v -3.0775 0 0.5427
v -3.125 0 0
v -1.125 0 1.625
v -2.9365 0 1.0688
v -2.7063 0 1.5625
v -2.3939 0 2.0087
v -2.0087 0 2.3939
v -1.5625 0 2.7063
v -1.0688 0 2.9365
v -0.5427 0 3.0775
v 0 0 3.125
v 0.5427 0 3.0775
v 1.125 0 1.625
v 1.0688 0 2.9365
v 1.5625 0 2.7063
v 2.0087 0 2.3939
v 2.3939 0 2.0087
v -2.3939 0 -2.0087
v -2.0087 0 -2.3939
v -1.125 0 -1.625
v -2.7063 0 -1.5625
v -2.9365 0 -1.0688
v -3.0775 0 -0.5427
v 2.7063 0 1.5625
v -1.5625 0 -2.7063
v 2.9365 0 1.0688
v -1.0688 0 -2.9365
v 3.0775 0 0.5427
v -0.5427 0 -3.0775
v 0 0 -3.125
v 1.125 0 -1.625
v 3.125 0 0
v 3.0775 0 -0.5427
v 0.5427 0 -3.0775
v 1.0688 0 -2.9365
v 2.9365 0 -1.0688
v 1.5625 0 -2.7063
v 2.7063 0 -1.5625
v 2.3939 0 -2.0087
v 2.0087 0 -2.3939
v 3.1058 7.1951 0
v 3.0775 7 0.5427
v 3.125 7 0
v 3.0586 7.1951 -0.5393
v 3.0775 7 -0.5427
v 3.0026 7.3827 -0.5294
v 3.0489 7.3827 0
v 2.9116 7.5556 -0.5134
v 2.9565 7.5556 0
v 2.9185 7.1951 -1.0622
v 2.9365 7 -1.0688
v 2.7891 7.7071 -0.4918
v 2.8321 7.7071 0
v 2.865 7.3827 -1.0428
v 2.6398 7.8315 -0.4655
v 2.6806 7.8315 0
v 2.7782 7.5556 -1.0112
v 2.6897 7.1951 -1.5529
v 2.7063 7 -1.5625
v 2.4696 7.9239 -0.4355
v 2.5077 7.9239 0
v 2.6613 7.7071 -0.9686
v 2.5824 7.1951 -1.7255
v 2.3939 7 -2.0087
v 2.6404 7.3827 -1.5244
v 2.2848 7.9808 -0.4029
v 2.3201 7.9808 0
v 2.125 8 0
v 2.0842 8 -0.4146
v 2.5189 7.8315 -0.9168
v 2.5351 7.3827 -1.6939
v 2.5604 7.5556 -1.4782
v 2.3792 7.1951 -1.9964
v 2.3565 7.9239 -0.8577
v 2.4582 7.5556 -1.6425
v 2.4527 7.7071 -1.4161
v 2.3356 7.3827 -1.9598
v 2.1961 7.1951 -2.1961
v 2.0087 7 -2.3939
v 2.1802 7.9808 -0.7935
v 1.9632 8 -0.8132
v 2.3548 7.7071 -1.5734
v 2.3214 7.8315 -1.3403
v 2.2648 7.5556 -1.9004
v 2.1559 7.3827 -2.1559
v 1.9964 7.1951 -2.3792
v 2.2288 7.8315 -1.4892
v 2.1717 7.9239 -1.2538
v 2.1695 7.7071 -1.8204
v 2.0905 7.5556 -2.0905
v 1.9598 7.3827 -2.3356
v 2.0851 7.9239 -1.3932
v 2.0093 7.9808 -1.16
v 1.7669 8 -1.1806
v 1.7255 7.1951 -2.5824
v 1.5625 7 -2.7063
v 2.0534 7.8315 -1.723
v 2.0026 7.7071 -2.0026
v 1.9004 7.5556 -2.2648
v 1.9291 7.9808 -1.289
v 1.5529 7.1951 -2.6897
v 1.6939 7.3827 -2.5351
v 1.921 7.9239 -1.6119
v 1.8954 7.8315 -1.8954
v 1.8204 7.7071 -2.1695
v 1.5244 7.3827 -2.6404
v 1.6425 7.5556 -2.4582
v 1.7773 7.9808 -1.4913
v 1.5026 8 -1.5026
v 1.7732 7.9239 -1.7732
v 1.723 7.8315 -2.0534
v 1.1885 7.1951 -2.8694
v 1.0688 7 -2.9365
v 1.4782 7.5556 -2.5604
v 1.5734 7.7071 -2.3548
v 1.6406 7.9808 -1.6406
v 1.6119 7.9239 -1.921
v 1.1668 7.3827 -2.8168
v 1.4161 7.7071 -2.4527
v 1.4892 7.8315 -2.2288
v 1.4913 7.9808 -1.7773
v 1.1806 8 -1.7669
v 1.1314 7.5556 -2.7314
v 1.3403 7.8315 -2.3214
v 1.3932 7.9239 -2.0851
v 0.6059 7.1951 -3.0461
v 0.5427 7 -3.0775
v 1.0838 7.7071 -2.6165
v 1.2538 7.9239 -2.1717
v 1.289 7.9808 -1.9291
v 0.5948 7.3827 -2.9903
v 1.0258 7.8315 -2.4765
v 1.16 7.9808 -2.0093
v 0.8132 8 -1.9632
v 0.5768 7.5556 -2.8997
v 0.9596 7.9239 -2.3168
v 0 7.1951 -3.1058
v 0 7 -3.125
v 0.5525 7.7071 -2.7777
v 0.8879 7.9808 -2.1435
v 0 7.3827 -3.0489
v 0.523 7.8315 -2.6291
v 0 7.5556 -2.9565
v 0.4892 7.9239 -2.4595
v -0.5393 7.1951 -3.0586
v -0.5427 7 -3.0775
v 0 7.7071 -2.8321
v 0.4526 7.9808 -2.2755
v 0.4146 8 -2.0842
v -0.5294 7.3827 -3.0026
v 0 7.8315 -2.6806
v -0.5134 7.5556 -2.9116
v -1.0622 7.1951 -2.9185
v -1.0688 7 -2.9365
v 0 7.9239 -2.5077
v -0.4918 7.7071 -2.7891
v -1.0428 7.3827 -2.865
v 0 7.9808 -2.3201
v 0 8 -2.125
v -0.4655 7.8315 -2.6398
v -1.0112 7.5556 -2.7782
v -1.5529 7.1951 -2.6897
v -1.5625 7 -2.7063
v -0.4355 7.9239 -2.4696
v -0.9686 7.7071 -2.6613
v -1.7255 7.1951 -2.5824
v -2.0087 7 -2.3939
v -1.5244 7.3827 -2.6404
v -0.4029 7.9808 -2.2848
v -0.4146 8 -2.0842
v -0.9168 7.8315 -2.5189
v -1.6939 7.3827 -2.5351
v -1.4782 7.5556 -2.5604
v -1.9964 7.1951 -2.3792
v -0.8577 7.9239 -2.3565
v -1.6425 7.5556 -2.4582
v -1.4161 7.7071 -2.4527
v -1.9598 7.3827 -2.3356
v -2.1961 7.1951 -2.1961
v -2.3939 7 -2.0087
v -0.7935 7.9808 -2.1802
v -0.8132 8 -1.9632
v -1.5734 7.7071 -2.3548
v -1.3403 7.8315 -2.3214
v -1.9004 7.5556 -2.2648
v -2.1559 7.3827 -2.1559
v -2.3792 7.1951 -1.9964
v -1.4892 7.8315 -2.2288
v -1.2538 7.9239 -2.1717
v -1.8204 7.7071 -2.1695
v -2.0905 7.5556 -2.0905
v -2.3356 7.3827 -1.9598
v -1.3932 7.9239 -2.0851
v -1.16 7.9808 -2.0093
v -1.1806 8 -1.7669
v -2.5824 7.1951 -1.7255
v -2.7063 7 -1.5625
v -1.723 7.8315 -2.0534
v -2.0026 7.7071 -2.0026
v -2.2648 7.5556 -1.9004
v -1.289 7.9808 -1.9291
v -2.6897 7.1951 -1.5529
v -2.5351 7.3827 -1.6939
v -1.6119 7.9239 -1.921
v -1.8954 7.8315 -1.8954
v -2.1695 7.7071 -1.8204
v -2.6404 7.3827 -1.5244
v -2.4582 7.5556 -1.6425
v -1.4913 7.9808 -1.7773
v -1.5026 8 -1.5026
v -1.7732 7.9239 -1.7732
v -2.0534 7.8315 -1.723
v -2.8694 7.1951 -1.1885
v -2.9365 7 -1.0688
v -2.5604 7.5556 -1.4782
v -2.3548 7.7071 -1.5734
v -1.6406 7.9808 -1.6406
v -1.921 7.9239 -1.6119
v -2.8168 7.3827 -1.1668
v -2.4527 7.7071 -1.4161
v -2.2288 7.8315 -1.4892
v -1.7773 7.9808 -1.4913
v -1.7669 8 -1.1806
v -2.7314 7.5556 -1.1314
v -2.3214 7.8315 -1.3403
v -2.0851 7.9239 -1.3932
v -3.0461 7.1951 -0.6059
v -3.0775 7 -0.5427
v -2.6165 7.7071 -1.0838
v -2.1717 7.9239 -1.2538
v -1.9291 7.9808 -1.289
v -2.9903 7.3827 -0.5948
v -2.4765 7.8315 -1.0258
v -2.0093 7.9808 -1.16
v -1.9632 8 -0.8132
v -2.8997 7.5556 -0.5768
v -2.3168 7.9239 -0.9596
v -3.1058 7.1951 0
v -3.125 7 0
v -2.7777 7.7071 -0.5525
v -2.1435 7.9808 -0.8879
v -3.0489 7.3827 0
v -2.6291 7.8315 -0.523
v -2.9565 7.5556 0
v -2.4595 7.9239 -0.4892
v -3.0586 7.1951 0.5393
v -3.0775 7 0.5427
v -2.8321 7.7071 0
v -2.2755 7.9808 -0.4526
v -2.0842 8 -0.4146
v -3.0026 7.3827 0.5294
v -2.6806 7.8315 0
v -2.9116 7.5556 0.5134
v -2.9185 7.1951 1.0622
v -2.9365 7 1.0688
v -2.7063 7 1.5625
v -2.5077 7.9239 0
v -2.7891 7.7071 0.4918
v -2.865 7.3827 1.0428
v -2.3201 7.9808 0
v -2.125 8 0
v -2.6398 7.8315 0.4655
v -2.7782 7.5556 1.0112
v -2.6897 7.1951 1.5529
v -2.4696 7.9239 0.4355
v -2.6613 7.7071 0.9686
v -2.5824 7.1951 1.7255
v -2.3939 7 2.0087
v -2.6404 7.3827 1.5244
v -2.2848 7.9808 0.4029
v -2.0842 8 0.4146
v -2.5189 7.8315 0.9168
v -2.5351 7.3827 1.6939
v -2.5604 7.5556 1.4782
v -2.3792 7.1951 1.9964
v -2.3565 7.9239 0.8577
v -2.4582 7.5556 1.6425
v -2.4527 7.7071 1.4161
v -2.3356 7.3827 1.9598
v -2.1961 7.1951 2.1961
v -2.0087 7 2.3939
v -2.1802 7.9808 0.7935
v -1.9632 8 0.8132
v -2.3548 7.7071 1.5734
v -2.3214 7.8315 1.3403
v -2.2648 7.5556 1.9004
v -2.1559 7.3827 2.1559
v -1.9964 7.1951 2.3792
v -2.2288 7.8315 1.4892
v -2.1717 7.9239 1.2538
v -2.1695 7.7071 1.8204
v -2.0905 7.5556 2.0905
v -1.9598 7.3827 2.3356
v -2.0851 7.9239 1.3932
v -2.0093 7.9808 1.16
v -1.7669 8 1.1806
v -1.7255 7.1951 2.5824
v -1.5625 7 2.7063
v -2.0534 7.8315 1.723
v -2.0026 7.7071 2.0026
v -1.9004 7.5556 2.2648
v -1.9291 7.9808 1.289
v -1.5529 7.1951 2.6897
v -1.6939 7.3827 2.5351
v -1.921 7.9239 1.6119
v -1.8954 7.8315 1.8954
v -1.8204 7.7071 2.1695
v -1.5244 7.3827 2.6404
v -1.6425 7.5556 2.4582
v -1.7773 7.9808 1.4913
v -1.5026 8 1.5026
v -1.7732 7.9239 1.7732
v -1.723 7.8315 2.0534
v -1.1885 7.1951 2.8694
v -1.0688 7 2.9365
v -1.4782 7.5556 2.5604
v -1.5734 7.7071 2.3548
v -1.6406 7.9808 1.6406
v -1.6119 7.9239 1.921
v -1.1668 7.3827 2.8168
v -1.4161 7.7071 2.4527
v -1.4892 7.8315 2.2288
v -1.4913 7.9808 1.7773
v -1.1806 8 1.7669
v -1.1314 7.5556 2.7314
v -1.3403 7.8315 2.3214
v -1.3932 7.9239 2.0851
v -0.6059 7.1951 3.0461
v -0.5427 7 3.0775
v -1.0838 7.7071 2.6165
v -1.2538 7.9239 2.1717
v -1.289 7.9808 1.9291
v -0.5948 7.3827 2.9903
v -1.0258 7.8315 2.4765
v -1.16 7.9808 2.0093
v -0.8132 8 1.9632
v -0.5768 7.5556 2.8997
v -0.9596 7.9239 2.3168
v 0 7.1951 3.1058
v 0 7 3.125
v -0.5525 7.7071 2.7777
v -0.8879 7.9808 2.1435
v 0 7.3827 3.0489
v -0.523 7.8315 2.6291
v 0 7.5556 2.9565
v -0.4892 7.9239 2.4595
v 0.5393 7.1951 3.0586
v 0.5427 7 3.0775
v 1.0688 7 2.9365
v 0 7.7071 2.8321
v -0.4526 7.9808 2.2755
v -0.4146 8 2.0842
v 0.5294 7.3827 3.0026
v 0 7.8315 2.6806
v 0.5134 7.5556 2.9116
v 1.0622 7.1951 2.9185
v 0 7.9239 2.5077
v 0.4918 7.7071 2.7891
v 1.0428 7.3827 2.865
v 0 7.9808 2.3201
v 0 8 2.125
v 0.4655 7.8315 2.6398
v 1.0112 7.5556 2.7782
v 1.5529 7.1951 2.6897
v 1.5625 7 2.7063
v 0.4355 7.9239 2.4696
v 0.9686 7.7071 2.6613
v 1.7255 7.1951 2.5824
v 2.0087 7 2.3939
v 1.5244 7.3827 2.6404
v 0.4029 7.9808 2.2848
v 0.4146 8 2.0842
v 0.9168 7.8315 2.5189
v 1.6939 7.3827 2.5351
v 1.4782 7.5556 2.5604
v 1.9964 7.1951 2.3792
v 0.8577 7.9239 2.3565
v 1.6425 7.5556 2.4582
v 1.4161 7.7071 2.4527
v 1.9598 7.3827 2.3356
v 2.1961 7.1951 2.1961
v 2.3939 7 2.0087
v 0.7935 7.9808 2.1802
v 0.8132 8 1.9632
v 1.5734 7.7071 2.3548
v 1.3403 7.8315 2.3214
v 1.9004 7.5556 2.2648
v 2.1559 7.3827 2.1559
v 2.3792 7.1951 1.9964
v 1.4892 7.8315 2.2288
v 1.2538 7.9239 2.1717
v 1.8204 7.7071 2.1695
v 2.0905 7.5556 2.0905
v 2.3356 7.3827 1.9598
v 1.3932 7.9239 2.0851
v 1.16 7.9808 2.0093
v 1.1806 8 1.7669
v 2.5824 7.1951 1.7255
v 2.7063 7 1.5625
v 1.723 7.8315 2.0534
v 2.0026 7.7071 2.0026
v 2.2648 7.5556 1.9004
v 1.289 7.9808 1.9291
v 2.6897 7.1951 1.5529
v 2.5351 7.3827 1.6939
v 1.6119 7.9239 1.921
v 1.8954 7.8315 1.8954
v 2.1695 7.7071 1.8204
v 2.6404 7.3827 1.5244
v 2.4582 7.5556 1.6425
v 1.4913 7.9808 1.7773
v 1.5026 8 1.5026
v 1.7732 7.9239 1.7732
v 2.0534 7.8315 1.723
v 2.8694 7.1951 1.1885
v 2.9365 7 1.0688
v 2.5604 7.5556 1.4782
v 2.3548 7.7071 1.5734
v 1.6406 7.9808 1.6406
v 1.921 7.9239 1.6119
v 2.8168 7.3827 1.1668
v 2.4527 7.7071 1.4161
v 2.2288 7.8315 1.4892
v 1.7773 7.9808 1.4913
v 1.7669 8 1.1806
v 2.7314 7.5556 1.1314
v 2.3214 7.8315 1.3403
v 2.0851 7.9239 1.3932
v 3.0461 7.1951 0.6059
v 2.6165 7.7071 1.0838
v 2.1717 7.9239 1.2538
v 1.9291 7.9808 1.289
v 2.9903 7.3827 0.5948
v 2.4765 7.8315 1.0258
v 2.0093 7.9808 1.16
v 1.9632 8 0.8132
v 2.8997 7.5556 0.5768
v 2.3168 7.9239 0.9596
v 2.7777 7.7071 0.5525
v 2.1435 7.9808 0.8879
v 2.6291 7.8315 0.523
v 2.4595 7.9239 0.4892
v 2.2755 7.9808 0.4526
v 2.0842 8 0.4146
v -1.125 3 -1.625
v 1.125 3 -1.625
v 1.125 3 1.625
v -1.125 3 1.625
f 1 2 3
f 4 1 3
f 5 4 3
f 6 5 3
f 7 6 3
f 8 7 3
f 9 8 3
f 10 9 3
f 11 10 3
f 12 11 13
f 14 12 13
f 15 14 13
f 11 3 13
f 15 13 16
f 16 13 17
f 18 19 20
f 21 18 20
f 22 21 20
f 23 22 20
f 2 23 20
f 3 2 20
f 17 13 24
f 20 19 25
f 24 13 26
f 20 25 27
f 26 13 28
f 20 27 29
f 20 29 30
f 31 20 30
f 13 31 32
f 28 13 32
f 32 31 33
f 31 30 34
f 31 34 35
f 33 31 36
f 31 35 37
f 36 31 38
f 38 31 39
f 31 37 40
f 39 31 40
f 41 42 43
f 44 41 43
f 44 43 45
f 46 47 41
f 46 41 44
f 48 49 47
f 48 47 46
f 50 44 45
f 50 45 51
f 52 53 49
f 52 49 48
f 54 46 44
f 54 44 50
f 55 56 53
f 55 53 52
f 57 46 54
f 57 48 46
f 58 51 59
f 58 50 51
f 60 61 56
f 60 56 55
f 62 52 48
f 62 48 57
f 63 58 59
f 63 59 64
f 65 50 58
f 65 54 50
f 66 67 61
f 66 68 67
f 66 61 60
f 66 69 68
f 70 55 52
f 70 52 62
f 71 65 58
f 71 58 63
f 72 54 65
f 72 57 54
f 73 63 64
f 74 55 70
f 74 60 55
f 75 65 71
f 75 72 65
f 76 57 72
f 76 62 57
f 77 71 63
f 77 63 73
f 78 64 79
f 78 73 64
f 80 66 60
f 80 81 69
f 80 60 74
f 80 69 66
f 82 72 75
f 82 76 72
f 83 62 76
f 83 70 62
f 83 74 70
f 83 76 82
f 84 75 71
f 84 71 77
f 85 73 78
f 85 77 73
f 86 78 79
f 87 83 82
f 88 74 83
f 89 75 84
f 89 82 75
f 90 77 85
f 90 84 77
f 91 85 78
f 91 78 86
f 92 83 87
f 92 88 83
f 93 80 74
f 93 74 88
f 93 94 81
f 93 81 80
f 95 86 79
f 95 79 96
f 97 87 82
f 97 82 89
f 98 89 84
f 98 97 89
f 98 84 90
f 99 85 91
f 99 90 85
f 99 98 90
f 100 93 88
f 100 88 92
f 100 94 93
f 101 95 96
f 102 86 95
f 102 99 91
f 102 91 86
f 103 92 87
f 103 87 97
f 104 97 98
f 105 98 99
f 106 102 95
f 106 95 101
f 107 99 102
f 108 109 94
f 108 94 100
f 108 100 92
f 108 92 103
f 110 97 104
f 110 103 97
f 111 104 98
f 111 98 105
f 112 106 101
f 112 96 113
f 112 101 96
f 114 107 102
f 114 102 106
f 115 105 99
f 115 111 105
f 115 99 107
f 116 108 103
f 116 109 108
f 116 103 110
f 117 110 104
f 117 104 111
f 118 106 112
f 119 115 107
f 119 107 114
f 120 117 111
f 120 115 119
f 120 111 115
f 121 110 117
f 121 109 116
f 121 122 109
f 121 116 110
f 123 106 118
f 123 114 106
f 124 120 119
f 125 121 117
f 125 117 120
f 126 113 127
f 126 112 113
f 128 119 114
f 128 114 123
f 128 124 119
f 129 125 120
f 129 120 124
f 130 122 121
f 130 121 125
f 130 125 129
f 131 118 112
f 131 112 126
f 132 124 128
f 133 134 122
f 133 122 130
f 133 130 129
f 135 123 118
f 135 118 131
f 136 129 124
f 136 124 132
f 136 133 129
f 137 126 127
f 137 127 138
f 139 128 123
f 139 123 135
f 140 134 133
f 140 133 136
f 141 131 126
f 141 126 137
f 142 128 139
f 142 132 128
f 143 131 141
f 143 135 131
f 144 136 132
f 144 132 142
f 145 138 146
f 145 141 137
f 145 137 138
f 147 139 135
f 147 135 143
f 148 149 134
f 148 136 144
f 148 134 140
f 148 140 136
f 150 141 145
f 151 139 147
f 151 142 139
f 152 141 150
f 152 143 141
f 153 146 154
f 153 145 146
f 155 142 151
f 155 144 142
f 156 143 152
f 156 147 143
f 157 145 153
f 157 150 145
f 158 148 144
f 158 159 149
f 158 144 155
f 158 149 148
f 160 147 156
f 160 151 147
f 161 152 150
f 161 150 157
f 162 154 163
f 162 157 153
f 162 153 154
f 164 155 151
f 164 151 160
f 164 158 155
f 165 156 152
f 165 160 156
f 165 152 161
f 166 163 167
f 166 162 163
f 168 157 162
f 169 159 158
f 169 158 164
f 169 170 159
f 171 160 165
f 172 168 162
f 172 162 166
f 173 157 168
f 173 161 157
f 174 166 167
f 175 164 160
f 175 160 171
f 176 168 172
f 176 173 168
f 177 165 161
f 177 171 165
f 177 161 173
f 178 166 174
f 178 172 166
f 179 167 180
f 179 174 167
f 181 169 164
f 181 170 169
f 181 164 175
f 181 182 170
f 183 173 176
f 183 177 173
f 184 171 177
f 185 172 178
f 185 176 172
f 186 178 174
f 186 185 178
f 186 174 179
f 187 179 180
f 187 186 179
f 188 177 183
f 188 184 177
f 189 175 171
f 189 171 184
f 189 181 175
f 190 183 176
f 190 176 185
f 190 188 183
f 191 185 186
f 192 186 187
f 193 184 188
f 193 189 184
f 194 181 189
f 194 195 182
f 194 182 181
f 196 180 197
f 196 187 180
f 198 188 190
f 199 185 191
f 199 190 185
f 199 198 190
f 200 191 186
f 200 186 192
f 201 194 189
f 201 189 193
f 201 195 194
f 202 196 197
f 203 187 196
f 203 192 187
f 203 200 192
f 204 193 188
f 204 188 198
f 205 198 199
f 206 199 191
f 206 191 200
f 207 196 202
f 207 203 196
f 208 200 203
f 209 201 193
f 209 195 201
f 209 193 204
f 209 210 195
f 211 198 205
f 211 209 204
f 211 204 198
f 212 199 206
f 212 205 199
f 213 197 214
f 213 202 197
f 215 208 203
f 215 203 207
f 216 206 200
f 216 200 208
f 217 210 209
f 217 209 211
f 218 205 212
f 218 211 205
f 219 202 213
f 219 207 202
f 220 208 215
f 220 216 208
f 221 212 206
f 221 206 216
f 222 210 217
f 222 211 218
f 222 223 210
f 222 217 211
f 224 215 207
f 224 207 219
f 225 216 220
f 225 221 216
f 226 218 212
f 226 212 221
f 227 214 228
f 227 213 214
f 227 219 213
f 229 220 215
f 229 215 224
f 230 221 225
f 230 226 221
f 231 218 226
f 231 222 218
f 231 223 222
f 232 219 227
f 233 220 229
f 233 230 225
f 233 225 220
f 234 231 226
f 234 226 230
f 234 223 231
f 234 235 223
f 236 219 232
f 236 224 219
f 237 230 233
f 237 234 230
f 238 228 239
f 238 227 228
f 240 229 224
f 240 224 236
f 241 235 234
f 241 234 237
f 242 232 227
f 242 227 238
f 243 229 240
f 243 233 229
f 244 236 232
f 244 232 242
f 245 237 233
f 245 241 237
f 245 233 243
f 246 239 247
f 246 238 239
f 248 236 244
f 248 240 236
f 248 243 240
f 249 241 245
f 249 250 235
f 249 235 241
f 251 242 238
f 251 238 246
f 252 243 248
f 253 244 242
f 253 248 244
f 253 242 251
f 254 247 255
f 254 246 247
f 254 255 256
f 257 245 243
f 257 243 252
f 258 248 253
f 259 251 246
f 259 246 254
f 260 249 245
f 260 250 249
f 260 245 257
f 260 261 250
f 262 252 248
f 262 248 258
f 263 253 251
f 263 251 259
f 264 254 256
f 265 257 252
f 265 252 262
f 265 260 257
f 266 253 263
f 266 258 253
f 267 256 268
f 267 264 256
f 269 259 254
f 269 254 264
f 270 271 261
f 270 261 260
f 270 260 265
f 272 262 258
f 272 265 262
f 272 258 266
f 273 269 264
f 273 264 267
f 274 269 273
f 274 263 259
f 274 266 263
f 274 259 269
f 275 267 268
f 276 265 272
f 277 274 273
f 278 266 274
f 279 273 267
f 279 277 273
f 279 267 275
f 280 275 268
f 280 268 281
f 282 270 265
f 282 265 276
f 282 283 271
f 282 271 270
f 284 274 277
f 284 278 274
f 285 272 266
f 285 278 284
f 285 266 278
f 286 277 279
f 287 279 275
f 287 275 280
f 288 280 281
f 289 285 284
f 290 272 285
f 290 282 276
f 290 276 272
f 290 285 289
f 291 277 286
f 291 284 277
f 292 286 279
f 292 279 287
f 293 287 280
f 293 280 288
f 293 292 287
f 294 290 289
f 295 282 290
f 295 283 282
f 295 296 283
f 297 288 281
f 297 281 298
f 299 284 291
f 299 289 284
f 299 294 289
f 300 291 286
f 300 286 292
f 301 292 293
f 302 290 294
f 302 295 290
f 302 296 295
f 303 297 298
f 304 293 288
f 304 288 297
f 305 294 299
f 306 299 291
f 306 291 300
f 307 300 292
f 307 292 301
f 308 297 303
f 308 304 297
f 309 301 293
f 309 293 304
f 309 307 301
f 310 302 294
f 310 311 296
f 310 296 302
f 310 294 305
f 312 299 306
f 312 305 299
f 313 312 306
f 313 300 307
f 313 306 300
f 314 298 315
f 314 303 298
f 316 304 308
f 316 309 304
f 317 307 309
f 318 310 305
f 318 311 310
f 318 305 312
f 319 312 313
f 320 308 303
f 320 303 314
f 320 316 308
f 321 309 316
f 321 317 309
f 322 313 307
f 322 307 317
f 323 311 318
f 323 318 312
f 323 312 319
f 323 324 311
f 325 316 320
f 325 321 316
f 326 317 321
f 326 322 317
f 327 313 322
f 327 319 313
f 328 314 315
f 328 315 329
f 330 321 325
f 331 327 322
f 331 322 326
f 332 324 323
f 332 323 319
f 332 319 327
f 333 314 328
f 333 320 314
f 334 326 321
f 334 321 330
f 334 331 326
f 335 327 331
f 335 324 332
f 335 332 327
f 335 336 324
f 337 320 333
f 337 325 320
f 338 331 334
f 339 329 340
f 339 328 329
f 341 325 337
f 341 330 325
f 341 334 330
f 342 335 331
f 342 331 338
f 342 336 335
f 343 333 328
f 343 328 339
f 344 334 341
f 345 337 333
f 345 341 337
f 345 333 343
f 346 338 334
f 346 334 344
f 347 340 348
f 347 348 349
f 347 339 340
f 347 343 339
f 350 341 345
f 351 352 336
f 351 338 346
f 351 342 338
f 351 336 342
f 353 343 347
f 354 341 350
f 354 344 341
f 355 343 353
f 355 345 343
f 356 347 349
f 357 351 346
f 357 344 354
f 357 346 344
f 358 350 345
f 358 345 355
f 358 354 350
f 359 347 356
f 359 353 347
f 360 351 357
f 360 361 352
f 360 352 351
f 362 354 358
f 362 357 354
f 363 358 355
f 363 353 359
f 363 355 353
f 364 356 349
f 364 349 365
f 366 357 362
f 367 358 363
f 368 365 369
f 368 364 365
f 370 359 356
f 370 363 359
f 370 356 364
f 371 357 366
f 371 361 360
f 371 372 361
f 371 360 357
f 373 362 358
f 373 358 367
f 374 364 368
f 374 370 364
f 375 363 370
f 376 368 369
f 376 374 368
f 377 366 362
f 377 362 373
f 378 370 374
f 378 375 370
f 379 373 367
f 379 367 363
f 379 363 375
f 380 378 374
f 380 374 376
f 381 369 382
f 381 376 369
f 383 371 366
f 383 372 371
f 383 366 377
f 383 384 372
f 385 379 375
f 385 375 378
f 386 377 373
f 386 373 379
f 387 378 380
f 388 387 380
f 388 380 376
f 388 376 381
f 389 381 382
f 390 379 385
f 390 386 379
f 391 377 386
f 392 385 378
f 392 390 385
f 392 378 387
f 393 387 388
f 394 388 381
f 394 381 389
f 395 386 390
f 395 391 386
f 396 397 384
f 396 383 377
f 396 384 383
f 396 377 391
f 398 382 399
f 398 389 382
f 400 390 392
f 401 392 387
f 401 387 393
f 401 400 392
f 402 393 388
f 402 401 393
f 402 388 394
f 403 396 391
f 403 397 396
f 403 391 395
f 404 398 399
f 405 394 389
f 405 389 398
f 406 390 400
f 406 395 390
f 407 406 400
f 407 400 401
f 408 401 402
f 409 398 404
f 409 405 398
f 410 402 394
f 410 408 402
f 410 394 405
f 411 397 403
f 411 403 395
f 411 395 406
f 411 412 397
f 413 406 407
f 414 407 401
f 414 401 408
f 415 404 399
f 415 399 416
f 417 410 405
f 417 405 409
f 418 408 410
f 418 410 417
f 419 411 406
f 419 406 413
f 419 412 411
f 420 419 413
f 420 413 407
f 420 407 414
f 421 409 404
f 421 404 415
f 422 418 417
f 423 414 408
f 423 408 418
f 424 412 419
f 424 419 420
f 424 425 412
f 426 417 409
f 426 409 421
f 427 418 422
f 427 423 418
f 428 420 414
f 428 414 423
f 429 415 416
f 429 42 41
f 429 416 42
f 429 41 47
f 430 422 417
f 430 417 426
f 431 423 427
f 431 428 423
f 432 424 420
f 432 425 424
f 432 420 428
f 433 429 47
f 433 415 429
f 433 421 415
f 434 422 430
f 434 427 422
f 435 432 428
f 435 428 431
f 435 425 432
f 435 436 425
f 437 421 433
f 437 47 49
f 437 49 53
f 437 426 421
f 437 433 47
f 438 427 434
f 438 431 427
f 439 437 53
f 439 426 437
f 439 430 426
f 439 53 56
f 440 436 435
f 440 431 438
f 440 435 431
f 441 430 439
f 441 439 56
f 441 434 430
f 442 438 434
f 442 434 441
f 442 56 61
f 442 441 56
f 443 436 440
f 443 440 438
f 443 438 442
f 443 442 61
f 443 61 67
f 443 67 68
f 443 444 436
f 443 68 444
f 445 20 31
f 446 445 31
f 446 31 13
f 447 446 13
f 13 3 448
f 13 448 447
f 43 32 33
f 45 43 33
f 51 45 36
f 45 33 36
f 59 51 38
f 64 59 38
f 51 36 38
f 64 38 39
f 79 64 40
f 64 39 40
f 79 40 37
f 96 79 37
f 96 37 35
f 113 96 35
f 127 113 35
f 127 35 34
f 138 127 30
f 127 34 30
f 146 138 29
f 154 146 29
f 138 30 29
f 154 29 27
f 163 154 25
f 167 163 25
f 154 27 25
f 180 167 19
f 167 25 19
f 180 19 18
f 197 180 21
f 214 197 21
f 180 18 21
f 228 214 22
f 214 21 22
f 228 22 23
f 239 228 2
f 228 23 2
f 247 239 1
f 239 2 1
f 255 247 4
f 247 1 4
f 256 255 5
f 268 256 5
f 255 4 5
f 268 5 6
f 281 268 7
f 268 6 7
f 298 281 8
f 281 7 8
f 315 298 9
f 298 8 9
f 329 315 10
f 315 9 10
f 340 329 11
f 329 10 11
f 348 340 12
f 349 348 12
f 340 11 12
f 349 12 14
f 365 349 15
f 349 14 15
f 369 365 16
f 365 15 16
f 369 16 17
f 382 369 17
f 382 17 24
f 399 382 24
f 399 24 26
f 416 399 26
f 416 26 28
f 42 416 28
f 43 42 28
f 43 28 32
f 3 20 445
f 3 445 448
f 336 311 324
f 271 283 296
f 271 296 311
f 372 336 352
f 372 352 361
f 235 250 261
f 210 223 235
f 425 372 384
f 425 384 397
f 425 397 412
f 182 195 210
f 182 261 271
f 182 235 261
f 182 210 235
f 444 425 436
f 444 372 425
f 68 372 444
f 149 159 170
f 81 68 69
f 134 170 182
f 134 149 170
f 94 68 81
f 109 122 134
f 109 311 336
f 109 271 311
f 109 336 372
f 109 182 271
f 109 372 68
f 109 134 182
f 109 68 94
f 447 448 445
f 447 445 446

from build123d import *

# Parameters (mm, degrees)
SKETCH1_R           = 3.125
BOSS_EXTRUDE1_DEPTH = 8
SKETCH2_W           = 2.25
SKETCH2_H           = 3.25
CUT_EXTRUDE1_DEPTH  = 3
FILLET1_R           = 1


with BuildPart() as part:
    # Sketch1 → Boss-Extrude1 (new body)
    with BuildSketch(Plane(origin=(0, 0, 0), x_dir=(1, 0, 0), z_dir=(0, 1, 0))):
        Circle(SKETCH1_R)
    extrude(amount=BOSS_EXTRUDE1_DEPTH)

    # Sketch2 → Cut-Extrude1 (cut)
    with BuildSketch(Plane.XZ):
        Rectangle(SKETCH2_W, SKETCH2_H)
    extrude(amount=-CUT_EXTRUDE1_DEPTH, mode=Mode.SUBTRACT)

    # Fillet1
    fillet1_edges = [part.edges().sort_by_distance(p)[0] for p in [
        (-3.125, 8, 0),
    ]]
    fillet(fillet1_edges, radius=FILLET1_R)


solid = part.part
